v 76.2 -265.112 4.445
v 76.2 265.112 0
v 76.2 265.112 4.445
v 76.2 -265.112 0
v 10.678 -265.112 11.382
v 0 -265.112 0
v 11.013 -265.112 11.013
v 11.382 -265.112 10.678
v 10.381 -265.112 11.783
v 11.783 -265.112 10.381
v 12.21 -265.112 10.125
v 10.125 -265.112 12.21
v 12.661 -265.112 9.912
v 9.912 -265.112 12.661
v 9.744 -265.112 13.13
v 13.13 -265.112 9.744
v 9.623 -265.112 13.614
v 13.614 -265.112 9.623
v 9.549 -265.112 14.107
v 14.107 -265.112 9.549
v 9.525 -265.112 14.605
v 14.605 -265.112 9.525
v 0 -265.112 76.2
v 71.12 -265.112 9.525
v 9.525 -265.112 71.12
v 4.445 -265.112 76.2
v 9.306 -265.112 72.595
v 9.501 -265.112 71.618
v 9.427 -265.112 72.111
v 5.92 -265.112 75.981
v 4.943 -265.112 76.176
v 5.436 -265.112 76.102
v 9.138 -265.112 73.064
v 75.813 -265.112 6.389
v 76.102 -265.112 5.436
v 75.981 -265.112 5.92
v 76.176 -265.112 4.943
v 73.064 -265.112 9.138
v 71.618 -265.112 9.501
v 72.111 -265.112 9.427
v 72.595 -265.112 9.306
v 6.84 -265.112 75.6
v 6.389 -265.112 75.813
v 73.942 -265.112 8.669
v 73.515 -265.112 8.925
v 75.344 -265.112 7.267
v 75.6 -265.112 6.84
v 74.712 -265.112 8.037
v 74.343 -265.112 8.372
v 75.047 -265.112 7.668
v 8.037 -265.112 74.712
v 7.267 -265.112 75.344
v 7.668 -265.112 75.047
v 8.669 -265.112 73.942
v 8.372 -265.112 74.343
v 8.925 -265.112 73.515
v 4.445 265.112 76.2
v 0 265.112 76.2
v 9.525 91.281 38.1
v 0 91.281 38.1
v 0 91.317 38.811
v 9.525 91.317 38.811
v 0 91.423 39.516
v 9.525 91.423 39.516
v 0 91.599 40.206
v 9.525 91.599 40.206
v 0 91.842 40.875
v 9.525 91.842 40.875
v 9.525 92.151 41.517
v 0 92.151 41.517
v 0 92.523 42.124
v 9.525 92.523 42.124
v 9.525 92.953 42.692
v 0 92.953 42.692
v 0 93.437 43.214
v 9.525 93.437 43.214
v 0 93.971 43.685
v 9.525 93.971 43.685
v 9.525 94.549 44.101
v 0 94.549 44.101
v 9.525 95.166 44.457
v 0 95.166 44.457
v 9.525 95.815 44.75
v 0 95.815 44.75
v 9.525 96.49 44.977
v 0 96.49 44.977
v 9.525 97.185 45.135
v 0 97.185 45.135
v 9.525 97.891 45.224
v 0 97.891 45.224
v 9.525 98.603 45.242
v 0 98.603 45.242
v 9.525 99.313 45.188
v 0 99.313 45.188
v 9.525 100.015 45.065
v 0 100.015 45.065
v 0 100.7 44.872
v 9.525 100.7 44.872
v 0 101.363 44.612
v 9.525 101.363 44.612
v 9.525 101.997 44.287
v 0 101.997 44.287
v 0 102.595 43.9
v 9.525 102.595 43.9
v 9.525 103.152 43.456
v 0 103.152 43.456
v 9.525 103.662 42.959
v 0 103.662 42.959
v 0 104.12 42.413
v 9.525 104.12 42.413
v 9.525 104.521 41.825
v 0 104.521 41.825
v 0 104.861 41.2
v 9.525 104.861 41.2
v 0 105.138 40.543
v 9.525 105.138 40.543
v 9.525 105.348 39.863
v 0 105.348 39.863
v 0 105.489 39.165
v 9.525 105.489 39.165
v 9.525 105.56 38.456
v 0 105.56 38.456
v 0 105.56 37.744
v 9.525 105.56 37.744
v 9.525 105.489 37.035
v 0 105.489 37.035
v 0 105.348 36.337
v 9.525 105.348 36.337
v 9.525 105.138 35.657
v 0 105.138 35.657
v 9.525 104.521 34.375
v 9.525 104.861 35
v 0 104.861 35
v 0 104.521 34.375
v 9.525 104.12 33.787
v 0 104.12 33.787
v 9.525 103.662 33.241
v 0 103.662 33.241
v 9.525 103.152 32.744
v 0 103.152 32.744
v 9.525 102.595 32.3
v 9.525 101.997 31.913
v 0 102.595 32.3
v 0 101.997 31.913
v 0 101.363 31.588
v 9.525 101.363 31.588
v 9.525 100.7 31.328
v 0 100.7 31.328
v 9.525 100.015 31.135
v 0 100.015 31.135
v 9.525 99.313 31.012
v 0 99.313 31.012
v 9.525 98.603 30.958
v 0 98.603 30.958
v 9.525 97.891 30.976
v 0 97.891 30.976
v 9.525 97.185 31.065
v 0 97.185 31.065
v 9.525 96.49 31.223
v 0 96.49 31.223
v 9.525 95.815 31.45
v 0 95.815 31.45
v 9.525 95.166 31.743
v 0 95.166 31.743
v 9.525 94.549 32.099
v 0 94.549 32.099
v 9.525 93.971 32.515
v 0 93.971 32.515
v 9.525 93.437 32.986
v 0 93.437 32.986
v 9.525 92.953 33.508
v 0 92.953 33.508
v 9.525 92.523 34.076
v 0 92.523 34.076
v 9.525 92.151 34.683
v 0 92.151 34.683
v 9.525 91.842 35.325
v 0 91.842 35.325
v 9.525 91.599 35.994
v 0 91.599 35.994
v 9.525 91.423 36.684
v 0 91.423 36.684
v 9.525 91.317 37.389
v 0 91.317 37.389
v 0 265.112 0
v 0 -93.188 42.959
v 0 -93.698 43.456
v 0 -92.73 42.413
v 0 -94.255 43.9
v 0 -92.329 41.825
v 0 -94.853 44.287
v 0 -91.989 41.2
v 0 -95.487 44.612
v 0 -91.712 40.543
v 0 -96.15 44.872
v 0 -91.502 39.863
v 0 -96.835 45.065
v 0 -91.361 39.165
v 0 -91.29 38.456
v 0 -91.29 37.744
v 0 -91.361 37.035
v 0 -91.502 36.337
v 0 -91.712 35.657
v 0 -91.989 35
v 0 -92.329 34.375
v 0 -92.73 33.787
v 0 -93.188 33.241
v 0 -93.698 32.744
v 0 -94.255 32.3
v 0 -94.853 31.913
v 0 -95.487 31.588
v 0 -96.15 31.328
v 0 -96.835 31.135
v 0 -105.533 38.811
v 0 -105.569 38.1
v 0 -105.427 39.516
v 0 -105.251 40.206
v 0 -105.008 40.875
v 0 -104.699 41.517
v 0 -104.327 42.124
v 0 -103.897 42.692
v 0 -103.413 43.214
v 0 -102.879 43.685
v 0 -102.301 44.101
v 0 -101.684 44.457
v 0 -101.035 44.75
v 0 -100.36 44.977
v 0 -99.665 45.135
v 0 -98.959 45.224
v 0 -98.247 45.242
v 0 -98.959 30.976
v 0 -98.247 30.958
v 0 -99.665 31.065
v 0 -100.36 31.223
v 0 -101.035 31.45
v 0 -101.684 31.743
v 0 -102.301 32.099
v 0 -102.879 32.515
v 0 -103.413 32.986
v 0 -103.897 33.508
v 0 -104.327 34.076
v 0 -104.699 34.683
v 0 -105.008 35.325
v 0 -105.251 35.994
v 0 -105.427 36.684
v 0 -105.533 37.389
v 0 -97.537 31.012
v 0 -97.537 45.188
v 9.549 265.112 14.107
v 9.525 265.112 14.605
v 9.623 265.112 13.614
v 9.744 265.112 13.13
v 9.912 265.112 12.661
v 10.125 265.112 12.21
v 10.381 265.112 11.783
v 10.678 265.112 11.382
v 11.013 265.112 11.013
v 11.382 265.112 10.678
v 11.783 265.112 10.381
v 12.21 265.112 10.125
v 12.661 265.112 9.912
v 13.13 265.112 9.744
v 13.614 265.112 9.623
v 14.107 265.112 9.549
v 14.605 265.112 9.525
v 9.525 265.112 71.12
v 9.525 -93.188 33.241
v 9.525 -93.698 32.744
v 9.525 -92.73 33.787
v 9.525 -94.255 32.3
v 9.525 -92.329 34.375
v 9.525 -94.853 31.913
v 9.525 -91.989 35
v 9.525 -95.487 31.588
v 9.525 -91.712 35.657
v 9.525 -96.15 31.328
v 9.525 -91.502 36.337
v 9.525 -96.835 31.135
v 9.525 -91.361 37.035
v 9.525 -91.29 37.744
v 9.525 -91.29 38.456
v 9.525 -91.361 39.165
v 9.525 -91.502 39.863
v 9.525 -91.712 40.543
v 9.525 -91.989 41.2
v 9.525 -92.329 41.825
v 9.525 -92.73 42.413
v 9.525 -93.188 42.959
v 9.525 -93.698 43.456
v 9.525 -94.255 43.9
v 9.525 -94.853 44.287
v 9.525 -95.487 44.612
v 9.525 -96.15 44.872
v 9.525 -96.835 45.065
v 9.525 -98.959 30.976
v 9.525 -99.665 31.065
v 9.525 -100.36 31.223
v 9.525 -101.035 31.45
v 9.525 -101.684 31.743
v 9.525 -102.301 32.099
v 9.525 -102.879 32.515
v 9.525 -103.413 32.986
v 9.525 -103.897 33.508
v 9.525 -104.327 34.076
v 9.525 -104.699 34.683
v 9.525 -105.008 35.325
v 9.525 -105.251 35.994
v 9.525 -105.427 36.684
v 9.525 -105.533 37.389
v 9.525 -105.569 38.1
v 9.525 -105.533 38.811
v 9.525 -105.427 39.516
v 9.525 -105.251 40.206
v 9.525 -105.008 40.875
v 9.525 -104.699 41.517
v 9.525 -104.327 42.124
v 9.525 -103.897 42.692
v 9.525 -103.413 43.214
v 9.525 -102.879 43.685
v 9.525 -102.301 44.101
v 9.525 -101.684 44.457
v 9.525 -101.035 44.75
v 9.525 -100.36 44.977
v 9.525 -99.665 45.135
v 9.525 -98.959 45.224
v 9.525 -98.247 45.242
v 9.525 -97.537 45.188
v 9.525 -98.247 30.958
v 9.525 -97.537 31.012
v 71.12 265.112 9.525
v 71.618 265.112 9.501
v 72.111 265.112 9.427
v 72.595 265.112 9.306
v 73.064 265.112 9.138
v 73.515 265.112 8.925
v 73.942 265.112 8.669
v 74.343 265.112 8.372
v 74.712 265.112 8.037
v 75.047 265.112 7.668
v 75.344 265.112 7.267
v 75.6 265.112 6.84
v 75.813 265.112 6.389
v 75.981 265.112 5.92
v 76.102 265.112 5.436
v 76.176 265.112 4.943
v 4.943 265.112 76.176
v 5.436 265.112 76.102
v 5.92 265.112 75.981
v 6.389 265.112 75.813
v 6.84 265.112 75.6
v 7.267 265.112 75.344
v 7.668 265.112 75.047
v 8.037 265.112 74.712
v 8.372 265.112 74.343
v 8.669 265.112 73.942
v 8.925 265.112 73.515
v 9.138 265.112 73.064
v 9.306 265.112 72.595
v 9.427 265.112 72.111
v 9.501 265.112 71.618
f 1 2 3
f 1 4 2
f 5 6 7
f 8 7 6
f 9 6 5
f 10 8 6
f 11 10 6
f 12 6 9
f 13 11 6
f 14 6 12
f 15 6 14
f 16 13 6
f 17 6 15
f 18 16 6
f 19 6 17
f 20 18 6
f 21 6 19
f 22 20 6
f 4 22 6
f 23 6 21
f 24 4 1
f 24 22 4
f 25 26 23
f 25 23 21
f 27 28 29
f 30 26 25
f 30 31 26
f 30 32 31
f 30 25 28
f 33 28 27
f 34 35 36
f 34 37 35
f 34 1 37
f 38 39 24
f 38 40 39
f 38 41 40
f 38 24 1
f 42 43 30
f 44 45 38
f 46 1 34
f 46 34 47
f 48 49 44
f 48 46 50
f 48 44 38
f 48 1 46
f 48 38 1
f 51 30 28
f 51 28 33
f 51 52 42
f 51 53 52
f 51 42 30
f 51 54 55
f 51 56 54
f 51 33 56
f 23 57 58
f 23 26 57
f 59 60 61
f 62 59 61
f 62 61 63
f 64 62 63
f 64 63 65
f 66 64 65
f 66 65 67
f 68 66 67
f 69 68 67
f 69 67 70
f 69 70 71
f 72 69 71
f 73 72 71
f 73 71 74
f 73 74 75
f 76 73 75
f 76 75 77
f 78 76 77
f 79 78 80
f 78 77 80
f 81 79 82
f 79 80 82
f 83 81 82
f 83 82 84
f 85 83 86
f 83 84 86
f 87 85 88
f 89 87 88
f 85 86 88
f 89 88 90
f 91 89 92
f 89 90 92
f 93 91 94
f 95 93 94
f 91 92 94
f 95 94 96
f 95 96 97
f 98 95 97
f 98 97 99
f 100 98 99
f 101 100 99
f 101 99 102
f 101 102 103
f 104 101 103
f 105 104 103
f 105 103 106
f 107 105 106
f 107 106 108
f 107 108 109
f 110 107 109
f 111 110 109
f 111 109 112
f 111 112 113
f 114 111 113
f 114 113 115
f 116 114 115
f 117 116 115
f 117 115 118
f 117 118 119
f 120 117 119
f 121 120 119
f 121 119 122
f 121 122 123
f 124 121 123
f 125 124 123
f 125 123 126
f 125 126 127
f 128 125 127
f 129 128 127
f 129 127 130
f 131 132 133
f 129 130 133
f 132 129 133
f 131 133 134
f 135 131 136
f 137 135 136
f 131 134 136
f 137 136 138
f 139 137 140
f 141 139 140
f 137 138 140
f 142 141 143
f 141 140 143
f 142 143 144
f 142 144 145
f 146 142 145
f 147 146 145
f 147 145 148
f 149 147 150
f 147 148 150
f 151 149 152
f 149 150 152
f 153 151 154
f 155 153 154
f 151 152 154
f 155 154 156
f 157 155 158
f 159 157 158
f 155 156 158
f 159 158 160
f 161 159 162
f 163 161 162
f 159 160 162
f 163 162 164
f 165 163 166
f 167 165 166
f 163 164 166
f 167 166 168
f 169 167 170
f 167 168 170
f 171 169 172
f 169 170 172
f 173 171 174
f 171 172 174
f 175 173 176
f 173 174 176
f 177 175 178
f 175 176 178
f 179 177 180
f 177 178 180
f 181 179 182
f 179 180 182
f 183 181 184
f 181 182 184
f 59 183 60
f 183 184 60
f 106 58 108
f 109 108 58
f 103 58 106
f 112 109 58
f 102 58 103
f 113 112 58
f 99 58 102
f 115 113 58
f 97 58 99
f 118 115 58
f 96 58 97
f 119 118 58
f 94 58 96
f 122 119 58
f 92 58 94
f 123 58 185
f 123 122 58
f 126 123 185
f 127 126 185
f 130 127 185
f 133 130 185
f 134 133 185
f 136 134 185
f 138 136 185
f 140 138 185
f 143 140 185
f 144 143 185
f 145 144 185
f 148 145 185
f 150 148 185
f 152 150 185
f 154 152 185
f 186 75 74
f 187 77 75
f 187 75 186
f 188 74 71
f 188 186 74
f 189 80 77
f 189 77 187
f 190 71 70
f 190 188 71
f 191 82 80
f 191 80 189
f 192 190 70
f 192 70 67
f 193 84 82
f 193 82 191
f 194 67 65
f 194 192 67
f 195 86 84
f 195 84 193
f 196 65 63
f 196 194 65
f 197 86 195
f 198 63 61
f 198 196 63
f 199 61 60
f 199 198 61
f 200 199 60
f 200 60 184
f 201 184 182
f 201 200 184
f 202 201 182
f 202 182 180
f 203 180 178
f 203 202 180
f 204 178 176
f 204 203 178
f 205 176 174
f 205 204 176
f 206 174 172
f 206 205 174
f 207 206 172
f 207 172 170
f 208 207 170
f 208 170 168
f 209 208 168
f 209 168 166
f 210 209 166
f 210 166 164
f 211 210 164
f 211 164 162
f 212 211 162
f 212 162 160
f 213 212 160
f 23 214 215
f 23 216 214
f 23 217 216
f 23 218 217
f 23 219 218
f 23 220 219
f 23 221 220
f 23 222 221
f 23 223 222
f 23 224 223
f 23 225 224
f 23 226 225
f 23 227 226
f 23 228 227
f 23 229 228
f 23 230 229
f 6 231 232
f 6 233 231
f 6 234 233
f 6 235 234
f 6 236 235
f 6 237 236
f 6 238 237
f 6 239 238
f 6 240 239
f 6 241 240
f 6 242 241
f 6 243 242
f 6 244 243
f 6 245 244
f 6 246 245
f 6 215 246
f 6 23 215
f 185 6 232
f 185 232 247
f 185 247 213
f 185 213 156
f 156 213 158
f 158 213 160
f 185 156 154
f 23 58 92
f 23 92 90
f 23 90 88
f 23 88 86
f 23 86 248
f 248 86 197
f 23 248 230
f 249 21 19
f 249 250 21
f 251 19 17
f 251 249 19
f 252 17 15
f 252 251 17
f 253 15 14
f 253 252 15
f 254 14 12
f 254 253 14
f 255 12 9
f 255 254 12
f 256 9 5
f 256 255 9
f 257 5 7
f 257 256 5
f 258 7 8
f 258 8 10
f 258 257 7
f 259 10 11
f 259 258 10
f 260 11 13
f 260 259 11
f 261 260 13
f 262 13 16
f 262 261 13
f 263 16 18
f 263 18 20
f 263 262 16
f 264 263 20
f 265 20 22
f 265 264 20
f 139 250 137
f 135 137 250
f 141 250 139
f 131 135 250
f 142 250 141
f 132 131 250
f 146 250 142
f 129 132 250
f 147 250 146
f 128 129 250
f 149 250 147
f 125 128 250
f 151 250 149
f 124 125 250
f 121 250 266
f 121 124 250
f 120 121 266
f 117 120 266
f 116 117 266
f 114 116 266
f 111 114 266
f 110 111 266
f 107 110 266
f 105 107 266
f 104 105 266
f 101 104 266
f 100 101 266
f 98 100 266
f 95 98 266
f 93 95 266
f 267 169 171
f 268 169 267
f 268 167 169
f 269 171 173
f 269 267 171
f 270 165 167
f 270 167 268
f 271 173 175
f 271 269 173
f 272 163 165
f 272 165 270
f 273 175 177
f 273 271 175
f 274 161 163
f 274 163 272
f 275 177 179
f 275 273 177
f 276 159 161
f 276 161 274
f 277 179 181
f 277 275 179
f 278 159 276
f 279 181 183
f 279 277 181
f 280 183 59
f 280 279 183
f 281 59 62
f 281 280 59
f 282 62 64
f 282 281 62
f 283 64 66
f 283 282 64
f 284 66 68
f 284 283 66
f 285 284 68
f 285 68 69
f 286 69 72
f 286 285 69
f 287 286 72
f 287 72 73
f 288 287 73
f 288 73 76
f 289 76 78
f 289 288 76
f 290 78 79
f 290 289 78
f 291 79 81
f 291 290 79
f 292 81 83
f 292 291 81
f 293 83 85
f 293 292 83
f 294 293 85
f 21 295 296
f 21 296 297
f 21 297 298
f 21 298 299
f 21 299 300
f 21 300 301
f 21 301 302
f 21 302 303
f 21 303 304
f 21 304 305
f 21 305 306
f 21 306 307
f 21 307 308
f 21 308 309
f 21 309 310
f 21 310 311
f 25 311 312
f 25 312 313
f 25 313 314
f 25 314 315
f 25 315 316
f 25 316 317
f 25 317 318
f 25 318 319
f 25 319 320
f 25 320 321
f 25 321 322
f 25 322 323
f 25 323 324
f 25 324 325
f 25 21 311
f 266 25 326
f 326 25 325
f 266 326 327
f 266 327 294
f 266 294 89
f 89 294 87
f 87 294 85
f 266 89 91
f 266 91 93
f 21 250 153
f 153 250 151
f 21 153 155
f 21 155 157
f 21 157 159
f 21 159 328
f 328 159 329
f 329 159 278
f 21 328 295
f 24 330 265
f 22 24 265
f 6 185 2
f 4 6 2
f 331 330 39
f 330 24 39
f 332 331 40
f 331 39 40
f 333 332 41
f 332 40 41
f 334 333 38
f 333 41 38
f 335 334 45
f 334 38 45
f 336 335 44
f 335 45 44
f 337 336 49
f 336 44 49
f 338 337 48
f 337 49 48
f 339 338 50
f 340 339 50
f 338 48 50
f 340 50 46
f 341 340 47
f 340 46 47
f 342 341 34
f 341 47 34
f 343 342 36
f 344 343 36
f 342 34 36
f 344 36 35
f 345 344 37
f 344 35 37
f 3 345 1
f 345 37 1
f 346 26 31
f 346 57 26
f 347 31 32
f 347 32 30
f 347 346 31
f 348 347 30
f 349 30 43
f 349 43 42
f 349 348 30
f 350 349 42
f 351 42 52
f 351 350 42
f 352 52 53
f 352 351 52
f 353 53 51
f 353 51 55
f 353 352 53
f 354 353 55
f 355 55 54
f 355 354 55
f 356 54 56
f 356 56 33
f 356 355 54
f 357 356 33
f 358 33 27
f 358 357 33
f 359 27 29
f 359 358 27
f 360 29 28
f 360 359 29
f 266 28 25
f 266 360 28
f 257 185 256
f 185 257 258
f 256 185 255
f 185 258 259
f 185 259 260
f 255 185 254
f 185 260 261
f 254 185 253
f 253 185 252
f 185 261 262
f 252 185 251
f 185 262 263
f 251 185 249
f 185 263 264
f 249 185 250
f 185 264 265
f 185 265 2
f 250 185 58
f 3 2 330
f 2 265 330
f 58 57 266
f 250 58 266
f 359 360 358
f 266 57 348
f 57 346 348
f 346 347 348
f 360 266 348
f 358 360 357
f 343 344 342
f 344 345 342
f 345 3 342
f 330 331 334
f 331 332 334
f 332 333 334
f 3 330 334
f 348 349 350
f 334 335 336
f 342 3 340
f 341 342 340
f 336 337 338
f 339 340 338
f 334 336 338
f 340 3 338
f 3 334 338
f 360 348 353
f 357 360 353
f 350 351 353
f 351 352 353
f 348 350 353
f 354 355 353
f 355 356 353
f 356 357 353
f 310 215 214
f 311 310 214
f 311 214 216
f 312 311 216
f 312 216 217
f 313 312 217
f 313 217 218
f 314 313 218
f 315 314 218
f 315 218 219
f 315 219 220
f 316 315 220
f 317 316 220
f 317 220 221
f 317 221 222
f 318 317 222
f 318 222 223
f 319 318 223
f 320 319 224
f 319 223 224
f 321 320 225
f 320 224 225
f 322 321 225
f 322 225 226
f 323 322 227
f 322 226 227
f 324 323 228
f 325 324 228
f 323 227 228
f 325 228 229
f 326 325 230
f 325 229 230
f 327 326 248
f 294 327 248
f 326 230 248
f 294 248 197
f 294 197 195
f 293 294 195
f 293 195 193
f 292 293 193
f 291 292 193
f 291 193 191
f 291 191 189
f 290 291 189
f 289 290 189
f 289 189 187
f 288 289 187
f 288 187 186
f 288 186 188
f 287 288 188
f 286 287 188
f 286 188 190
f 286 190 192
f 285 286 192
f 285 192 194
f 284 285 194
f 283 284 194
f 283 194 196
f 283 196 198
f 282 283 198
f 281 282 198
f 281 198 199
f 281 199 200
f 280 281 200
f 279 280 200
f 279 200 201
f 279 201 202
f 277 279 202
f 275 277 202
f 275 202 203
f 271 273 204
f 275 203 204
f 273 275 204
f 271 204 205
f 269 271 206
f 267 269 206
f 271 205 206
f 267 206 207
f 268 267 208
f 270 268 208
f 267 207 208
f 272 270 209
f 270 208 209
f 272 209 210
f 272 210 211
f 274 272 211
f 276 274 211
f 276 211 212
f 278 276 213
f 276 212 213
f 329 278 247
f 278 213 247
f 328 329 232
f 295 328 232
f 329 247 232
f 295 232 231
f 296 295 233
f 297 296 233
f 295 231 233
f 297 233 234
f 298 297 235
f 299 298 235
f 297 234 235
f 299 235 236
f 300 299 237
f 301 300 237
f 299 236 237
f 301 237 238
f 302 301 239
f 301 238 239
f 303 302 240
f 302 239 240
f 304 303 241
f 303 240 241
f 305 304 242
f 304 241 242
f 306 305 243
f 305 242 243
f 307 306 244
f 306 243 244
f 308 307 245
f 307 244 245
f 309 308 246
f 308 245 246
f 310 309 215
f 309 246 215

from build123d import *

# Parameters (mm, degrees)
F1_DEPTH = 265.1125
F2_R     = 5.08
F3_R     = 7.14375
F4_DEPTH = 25.4


with BuildPart() as f1:
    # F0 (on Front) → F1 (new body, symmetric)
    with BuildSketch(Plane.XZ):
        Polygon((0, 76.2), (0, 0), (76.2, 0), (76.2, 9.525), (9.525, 9.525), (9.525, 76.2), align=None)
    extrude(amount=F1_DEPTH, both=True)

    # F2
    f2_edges = [f1.edges().sort_by_distance(p)[0] for p in [
        (9.525, 0, 76.2),
        (9.525, 0, 9.525),
        (76.2, 0, 9.525),
    ]]
    fillet(f2_edges, radius=F2_R)

    # F3 (on face) → F4 (cut)
    with BuildSketch(Plane(origin=(0, 0, 0), x_dir=(0, -1, 0), z_dir=(-1, 0, 0))):
        with Locations((-98.425, 38.1)):
            Circle(F3_R)
        with Locations((98.425, 38.1)):
            Circle(F3_R)
    extrude(amount=-F4_DEPTH, mode=Mode.SUBTRACT)


solid = f1.part
